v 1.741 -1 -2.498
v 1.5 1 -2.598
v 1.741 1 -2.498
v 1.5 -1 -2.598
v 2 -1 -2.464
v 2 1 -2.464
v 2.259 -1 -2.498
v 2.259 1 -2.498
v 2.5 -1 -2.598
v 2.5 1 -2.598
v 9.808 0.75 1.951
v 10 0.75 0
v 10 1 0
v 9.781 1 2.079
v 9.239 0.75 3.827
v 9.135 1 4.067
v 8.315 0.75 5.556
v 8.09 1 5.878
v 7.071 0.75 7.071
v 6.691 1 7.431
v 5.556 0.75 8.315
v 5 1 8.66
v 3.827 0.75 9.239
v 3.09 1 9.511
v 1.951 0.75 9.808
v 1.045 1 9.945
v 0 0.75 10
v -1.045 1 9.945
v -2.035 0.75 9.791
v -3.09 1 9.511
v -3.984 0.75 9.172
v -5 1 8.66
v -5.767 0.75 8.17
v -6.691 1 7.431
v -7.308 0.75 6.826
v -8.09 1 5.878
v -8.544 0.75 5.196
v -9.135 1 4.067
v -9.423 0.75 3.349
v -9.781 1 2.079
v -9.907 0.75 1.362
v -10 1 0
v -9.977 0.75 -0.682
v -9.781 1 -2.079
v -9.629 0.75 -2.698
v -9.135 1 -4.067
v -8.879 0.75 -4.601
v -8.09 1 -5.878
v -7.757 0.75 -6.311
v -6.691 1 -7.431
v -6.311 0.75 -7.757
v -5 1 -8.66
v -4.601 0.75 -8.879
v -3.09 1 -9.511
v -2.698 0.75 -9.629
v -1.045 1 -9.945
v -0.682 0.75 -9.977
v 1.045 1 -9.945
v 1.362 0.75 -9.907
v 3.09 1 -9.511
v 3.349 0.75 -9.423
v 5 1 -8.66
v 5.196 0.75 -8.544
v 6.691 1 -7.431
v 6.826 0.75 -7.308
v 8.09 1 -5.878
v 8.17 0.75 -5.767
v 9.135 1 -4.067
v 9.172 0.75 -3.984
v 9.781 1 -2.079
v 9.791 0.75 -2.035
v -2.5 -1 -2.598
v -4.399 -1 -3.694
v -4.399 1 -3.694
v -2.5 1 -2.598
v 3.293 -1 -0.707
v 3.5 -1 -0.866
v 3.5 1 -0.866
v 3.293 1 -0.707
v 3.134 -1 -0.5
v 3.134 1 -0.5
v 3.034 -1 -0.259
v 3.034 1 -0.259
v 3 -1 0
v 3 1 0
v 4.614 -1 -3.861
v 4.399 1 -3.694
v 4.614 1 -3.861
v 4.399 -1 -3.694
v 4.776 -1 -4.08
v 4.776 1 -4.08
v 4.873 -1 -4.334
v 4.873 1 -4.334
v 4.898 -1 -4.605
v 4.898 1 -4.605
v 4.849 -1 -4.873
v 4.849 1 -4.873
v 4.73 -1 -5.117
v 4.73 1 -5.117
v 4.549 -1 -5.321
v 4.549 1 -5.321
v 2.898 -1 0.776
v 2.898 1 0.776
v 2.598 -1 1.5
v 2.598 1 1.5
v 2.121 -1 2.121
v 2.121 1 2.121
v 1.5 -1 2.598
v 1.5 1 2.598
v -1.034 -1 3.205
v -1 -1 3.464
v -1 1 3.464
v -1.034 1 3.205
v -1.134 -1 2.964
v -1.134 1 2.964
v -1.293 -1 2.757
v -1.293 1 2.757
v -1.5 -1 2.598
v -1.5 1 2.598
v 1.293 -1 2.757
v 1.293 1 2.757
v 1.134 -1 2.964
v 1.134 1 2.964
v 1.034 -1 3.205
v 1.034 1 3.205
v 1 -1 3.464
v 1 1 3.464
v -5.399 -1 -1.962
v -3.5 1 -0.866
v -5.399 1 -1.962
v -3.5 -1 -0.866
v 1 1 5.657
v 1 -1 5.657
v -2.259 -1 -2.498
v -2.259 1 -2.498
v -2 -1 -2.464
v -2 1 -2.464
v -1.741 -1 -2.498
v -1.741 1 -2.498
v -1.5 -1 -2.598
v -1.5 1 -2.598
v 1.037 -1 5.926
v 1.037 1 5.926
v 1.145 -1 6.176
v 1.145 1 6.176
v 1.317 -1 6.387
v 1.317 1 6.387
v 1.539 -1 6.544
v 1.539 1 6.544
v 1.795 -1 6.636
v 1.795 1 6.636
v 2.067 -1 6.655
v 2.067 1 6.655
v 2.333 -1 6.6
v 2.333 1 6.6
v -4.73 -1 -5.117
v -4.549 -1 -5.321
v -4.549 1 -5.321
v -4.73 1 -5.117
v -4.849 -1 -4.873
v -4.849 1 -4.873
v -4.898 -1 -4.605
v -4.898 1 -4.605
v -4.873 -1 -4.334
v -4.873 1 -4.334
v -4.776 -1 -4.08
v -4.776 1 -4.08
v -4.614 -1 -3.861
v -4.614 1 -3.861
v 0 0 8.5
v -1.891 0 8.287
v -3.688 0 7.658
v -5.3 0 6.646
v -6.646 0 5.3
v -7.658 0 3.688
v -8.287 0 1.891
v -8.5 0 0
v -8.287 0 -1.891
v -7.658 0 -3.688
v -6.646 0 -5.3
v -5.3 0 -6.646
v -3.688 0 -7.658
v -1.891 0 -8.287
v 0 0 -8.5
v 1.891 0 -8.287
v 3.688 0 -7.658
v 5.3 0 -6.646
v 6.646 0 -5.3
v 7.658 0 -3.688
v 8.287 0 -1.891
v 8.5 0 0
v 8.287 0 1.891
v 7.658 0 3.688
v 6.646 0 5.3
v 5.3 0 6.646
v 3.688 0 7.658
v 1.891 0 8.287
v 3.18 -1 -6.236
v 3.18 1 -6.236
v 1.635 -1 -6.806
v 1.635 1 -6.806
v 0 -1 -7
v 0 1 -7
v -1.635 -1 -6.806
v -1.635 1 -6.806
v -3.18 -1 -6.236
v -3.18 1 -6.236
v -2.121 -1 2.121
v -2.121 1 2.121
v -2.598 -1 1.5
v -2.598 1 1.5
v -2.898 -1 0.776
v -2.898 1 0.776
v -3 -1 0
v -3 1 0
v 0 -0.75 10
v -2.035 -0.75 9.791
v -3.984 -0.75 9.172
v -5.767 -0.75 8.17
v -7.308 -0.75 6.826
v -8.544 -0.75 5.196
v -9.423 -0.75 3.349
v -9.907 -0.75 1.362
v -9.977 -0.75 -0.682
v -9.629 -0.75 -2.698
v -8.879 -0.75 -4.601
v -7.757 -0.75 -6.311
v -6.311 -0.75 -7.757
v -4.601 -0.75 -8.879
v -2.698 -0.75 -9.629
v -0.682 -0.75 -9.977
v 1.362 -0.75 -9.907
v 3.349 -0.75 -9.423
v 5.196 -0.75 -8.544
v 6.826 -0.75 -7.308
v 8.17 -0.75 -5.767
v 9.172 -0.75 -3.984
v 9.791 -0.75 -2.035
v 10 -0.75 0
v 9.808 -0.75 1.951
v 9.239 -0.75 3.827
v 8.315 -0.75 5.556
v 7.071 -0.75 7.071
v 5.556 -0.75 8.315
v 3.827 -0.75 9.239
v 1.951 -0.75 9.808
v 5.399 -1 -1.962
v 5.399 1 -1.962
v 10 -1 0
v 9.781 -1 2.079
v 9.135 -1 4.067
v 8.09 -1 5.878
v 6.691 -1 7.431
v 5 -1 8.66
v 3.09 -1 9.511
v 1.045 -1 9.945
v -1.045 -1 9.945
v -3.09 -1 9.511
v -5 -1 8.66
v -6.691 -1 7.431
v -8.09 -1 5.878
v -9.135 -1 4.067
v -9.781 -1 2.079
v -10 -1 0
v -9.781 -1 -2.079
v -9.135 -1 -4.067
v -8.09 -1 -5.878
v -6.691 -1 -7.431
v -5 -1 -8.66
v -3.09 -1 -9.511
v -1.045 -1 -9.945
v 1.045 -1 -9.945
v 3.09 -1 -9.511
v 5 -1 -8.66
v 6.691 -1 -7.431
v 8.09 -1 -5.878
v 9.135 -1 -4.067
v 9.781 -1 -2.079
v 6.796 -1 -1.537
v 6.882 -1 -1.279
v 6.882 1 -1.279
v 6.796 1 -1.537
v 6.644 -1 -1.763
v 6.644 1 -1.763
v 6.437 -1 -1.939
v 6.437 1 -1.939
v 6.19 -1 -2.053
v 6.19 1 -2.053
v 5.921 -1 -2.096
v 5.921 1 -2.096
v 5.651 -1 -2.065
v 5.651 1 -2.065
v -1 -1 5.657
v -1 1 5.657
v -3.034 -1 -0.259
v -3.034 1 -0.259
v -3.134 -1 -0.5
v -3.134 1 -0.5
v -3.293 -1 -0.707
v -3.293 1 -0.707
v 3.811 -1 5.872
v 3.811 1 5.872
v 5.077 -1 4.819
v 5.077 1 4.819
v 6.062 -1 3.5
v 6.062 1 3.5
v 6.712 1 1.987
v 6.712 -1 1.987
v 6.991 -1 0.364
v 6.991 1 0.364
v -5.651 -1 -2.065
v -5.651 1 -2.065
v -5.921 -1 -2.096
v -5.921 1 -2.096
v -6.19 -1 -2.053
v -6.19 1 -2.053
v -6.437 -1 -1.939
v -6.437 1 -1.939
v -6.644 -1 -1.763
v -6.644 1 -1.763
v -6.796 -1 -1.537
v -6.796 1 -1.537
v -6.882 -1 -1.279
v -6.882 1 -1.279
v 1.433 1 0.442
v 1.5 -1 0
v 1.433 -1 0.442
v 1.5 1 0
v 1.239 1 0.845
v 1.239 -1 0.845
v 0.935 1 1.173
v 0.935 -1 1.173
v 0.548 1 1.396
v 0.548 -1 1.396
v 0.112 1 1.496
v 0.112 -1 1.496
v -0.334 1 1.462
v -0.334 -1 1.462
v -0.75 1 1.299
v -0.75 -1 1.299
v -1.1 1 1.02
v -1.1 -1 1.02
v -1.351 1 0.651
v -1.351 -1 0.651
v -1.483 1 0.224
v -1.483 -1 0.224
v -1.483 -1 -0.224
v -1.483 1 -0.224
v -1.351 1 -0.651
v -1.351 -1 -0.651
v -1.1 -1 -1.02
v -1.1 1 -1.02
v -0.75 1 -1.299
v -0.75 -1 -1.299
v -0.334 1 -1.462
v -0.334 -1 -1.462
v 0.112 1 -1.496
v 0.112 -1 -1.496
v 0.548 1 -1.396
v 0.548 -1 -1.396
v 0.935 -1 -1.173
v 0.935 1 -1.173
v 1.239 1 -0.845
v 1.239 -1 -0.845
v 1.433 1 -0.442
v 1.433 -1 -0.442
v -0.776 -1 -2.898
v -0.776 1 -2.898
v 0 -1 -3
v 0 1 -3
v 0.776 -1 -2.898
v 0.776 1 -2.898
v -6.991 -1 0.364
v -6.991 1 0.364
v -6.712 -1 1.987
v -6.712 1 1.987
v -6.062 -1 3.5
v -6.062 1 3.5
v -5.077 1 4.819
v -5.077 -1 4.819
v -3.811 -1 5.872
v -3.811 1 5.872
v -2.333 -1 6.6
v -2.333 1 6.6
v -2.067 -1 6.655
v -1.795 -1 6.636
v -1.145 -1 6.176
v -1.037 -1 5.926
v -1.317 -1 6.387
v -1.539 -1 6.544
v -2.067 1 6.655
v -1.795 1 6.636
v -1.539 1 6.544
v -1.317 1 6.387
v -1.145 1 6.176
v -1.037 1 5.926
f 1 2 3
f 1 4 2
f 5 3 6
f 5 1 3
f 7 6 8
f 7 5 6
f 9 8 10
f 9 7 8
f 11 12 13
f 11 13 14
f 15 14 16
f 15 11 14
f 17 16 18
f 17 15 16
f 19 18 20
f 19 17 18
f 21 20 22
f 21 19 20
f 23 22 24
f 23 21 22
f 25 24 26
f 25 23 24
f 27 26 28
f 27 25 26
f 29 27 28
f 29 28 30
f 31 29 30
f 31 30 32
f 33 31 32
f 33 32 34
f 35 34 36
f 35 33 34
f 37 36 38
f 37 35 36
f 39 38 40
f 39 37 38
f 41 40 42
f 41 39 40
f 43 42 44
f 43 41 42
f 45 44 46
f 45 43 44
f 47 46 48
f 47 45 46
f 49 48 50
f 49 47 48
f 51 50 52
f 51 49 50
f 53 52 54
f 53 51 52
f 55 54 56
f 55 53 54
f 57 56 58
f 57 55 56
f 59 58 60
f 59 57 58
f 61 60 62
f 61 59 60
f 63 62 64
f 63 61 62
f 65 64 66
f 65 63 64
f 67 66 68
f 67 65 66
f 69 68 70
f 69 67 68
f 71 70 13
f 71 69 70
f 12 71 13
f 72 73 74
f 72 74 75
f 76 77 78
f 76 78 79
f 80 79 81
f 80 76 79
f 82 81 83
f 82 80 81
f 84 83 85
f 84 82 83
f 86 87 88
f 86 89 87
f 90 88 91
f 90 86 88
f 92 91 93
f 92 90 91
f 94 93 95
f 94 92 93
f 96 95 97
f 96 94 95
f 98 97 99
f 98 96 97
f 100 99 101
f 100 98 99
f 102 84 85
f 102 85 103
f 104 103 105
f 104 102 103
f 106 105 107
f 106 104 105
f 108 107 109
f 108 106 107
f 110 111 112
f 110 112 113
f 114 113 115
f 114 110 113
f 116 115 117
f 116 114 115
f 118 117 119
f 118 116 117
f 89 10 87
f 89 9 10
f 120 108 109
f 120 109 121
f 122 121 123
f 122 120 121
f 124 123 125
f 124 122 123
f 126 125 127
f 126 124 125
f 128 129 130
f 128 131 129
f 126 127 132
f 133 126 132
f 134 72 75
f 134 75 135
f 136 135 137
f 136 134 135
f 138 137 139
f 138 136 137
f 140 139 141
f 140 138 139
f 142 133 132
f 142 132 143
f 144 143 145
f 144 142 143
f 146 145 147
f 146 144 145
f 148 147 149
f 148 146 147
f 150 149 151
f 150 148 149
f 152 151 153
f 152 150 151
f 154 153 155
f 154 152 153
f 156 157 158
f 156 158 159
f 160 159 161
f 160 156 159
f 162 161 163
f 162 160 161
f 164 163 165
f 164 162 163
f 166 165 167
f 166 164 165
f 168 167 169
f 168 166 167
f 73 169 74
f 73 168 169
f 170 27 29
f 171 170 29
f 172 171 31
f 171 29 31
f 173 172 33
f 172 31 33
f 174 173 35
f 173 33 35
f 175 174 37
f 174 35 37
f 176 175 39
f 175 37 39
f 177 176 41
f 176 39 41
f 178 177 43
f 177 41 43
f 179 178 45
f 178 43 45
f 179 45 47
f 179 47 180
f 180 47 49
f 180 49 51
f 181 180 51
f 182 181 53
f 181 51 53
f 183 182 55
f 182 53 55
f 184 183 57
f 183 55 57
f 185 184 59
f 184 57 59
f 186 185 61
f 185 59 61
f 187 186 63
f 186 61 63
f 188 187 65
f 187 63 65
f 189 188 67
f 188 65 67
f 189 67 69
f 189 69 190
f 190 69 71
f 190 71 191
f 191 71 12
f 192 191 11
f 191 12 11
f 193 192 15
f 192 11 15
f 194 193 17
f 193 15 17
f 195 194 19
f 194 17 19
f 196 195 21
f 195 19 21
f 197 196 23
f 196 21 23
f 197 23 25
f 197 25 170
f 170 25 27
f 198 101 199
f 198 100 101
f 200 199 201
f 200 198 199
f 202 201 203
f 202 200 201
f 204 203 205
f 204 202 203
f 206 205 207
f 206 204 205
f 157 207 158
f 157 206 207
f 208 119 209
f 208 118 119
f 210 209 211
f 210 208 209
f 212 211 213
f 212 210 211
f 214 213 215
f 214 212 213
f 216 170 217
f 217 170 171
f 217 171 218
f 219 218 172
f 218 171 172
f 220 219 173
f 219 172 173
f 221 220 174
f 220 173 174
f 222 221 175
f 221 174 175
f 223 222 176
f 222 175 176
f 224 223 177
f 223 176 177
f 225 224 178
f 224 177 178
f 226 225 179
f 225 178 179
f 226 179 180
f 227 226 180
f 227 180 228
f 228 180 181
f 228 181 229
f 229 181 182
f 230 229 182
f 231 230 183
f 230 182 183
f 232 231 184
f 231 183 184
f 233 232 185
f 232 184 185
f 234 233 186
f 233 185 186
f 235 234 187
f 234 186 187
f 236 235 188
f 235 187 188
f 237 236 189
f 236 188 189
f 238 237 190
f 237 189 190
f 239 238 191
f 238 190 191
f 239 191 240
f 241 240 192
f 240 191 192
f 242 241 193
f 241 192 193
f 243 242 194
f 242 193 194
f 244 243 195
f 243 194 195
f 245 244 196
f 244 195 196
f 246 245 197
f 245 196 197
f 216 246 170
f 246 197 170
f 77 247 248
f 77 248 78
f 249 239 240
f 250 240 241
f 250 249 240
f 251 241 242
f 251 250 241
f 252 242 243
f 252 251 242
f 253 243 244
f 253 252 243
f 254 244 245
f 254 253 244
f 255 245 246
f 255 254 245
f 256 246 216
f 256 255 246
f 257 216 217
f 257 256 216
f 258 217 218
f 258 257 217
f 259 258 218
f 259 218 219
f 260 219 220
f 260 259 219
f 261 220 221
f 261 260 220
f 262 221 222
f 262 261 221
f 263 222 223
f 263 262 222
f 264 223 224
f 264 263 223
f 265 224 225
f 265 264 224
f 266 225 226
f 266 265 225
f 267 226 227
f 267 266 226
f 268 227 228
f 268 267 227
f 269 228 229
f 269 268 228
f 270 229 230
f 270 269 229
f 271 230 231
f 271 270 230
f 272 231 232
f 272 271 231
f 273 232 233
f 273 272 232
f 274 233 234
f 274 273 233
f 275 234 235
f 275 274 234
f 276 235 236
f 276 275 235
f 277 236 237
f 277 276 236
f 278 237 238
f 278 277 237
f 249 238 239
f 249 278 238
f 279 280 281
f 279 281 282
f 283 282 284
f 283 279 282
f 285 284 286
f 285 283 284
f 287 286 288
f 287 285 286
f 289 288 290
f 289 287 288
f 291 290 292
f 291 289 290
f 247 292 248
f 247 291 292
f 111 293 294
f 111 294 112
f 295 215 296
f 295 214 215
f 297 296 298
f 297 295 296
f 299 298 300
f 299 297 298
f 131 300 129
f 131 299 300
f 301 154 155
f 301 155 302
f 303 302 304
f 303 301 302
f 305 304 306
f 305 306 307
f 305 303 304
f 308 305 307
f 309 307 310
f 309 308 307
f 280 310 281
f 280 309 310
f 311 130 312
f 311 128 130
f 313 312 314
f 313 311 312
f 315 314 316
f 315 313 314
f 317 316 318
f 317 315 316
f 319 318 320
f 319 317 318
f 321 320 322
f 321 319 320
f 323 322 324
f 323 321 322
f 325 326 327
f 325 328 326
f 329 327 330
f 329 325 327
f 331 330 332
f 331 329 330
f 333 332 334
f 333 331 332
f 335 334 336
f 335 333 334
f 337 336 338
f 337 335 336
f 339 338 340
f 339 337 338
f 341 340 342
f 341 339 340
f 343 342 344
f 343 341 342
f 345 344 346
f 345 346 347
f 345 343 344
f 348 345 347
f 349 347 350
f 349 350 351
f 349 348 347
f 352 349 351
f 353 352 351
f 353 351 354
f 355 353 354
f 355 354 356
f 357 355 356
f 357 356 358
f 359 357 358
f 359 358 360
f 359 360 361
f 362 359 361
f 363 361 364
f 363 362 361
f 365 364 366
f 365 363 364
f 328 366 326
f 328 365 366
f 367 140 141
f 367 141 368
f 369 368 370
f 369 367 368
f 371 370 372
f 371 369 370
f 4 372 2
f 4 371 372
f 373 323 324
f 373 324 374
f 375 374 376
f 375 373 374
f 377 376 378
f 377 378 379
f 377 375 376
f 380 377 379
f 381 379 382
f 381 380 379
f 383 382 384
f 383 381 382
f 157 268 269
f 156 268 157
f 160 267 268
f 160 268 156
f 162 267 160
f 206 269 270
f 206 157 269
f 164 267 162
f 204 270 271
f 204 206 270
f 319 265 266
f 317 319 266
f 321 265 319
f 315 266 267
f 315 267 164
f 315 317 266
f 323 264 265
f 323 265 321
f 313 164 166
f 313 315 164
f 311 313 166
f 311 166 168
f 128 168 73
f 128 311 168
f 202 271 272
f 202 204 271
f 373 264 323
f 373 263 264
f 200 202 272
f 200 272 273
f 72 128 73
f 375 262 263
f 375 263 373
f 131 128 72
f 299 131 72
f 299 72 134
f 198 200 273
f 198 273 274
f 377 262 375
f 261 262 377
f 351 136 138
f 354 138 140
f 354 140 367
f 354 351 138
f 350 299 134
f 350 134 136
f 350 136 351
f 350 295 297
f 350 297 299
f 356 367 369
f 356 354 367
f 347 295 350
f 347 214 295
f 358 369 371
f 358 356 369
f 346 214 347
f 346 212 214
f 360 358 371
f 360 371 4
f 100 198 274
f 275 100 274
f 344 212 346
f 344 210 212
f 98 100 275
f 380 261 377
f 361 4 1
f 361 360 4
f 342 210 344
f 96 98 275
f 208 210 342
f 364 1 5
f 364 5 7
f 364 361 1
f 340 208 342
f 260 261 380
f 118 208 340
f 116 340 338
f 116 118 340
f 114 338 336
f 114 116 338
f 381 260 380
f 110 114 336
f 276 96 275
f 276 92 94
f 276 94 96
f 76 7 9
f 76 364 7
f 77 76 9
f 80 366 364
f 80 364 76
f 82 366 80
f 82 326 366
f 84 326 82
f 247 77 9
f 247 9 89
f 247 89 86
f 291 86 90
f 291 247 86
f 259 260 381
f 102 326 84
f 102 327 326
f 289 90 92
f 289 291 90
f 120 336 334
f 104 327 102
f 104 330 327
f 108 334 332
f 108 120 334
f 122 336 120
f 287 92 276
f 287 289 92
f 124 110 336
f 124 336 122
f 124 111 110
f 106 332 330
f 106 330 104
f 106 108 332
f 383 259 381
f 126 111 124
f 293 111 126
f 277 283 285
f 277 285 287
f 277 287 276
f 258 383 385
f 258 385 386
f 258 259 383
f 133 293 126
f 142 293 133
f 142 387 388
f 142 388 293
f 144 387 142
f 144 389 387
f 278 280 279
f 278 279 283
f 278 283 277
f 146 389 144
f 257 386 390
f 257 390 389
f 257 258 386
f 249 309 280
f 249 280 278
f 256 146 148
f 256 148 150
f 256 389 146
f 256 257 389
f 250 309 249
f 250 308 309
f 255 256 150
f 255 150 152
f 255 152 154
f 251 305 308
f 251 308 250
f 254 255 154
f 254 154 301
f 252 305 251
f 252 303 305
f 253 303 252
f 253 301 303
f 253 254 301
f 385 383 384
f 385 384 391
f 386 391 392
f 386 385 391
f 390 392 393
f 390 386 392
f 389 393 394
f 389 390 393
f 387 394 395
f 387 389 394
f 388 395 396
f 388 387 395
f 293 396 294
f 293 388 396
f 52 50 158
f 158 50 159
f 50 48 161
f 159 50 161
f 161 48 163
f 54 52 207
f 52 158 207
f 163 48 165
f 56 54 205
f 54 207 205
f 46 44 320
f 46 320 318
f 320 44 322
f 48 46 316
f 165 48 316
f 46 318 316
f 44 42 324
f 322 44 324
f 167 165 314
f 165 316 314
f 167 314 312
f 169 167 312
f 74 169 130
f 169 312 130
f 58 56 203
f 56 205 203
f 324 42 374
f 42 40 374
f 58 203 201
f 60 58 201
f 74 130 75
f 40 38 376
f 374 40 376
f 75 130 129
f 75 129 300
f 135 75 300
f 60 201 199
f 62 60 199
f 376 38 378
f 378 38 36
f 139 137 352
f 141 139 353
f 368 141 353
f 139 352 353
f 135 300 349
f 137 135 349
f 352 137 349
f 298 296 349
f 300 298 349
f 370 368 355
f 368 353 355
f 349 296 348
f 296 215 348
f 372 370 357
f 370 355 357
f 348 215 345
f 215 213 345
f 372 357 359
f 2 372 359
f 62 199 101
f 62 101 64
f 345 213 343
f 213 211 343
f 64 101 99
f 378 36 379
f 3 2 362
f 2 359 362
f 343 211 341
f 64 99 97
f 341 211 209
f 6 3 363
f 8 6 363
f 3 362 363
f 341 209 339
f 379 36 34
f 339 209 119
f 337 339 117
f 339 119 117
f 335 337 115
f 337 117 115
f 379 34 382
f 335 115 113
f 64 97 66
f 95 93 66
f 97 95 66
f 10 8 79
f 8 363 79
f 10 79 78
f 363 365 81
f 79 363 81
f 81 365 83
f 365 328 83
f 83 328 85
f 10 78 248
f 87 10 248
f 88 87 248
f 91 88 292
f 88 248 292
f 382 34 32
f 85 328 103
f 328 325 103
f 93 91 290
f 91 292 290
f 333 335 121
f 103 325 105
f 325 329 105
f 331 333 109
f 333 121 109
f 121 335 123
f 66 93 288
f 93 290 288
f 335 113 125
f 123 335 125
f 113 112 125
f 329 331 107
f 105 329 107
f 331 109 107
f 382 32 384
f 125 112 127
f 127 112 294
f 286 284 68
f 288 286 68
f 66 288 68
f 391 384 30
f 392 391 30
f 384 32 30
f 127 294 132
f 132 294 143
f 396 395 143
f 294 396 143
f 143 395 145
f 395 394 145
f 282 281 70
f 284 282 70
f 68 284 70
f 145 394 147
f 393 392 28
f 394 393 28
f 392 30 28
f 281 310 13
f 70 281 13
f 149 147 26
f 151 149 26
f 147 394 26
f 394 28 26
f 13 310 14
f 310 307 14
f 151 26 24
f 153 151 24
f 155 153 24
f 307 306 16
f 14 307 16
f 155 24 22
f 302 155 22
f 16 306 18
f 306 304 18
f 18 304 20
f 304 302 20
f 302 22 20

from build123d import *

# Parameters (mm, degrees)
F0_R     = 10
F0_R_2   = 1.5
F1_DEPTH = 1


with BuildPart() as f1:
    # F0 (on Front) → F1 (new body, symmetric)
    with BuildSketch(Plane.XZ):
        Circle(F0_R)
        with BuildLine():
            ThreePointArc((-4.548809, -5.320558), (-4.894761, -4.468726), (-4.398979, -3.694453))
            Line((-4.398979, -3.694453), (-2.5, -2.598076))
            ThreePointArc((-2.5, -2.598076), (-2, -2.464102), (-1.5, -2.598076))
            ThreePointArc((-1.5, -2.598076), (0, -3), (1.5, -2.598076))
            ThreePointArc((1.5, -2.598076), (2, -2.464102), (2.5, -2.598076))
            Line((2.5, -2.598076), (4.398979, -3.694453))
            ThreePointArc((4.398979, -3.694453), (4.894761, -4.468726), (4.548809, -5.320558))
            ThreePointArc((4.548809, -5.320558), (0, -7), (-4.548809, -5.320558))
        make_face(mode=Mode.SUBTRACT)
        with BuildLine():
            ThreePointArc((-6.882143, -1.279106), (-6.062178, 3.5), (-2.333333, 6.599663))
            ThreePointArc((-2.333333, 6.599663), (-1.42265, 6.473351), (-1, 5.656854))
            Line((-1, 5.656854), (-1, 3.464102))
            ThreePointArc((-1, 3.464102), (-1.133975, 2.964102), (-1.5, 2.598076))
            ThreePointArc((-1.5, 2.598076), (-2.598076, 1.5), (-3, 0))
            ThreePointArc((-3, 0), (-3.133975, -0.5), (-3.5, -0.866025))
            Line((-3.5, -0.866025), (-5.398979, -1.962402))
            ThreePointArc((-5.398979, -1.962402), (-6.317411, -2.004625), (-6.882143, -1.279106))
        make_face(mode=Mode.SUBTRACT)
        Circle(F0_R_2, mode=Mode.SUBTRACT)
        with BuildLine():
            Line((1, 3.464102), (1, 5.656854))
            ThreePointArc((1, 5.656854), (1.42265, 6.473351), (2.333333, 6.599663))
            ThreePointArc((2.333333, 6.599663), (6.062178, 3.5), (6.882143, -1.279106))
            ThreePointArc((6.882143, -1.279106), (6.317411, -2.004625), (5.398979, -1.962402))
            Line((5.398979, -1.962402), (3.5, -0.866025))
            ThreePointArc((3.5, -0.866025), (3.133975, -0.5), (3, 0))
            ThreePointArc((3, 0), (2.598076, 1.5), (1.5, 2.598076))
            ThreePointArc((1.5, 2.598076), (1.133975, 2.964102), (1, 3.464102))
        make_face(mode=Mode.SUBTRACT)
    extrude(amount=F1_DEPTH, both=True)

    # F2 (on Right) → F3 (revolve, cut)
    with BuildSketch(Plane.YZ):
        Polygon((-0.75, 10), (0, 8.5), (0, 10), align=None)
        Polygon((0, 10), (0, 8.5), (0.75, 10), align=None)
    revolve(axis=Axis((0, -0.781199, 0), (0, -1, 0)), mode=Mode.SUBTRACT)


solid = f1.part
